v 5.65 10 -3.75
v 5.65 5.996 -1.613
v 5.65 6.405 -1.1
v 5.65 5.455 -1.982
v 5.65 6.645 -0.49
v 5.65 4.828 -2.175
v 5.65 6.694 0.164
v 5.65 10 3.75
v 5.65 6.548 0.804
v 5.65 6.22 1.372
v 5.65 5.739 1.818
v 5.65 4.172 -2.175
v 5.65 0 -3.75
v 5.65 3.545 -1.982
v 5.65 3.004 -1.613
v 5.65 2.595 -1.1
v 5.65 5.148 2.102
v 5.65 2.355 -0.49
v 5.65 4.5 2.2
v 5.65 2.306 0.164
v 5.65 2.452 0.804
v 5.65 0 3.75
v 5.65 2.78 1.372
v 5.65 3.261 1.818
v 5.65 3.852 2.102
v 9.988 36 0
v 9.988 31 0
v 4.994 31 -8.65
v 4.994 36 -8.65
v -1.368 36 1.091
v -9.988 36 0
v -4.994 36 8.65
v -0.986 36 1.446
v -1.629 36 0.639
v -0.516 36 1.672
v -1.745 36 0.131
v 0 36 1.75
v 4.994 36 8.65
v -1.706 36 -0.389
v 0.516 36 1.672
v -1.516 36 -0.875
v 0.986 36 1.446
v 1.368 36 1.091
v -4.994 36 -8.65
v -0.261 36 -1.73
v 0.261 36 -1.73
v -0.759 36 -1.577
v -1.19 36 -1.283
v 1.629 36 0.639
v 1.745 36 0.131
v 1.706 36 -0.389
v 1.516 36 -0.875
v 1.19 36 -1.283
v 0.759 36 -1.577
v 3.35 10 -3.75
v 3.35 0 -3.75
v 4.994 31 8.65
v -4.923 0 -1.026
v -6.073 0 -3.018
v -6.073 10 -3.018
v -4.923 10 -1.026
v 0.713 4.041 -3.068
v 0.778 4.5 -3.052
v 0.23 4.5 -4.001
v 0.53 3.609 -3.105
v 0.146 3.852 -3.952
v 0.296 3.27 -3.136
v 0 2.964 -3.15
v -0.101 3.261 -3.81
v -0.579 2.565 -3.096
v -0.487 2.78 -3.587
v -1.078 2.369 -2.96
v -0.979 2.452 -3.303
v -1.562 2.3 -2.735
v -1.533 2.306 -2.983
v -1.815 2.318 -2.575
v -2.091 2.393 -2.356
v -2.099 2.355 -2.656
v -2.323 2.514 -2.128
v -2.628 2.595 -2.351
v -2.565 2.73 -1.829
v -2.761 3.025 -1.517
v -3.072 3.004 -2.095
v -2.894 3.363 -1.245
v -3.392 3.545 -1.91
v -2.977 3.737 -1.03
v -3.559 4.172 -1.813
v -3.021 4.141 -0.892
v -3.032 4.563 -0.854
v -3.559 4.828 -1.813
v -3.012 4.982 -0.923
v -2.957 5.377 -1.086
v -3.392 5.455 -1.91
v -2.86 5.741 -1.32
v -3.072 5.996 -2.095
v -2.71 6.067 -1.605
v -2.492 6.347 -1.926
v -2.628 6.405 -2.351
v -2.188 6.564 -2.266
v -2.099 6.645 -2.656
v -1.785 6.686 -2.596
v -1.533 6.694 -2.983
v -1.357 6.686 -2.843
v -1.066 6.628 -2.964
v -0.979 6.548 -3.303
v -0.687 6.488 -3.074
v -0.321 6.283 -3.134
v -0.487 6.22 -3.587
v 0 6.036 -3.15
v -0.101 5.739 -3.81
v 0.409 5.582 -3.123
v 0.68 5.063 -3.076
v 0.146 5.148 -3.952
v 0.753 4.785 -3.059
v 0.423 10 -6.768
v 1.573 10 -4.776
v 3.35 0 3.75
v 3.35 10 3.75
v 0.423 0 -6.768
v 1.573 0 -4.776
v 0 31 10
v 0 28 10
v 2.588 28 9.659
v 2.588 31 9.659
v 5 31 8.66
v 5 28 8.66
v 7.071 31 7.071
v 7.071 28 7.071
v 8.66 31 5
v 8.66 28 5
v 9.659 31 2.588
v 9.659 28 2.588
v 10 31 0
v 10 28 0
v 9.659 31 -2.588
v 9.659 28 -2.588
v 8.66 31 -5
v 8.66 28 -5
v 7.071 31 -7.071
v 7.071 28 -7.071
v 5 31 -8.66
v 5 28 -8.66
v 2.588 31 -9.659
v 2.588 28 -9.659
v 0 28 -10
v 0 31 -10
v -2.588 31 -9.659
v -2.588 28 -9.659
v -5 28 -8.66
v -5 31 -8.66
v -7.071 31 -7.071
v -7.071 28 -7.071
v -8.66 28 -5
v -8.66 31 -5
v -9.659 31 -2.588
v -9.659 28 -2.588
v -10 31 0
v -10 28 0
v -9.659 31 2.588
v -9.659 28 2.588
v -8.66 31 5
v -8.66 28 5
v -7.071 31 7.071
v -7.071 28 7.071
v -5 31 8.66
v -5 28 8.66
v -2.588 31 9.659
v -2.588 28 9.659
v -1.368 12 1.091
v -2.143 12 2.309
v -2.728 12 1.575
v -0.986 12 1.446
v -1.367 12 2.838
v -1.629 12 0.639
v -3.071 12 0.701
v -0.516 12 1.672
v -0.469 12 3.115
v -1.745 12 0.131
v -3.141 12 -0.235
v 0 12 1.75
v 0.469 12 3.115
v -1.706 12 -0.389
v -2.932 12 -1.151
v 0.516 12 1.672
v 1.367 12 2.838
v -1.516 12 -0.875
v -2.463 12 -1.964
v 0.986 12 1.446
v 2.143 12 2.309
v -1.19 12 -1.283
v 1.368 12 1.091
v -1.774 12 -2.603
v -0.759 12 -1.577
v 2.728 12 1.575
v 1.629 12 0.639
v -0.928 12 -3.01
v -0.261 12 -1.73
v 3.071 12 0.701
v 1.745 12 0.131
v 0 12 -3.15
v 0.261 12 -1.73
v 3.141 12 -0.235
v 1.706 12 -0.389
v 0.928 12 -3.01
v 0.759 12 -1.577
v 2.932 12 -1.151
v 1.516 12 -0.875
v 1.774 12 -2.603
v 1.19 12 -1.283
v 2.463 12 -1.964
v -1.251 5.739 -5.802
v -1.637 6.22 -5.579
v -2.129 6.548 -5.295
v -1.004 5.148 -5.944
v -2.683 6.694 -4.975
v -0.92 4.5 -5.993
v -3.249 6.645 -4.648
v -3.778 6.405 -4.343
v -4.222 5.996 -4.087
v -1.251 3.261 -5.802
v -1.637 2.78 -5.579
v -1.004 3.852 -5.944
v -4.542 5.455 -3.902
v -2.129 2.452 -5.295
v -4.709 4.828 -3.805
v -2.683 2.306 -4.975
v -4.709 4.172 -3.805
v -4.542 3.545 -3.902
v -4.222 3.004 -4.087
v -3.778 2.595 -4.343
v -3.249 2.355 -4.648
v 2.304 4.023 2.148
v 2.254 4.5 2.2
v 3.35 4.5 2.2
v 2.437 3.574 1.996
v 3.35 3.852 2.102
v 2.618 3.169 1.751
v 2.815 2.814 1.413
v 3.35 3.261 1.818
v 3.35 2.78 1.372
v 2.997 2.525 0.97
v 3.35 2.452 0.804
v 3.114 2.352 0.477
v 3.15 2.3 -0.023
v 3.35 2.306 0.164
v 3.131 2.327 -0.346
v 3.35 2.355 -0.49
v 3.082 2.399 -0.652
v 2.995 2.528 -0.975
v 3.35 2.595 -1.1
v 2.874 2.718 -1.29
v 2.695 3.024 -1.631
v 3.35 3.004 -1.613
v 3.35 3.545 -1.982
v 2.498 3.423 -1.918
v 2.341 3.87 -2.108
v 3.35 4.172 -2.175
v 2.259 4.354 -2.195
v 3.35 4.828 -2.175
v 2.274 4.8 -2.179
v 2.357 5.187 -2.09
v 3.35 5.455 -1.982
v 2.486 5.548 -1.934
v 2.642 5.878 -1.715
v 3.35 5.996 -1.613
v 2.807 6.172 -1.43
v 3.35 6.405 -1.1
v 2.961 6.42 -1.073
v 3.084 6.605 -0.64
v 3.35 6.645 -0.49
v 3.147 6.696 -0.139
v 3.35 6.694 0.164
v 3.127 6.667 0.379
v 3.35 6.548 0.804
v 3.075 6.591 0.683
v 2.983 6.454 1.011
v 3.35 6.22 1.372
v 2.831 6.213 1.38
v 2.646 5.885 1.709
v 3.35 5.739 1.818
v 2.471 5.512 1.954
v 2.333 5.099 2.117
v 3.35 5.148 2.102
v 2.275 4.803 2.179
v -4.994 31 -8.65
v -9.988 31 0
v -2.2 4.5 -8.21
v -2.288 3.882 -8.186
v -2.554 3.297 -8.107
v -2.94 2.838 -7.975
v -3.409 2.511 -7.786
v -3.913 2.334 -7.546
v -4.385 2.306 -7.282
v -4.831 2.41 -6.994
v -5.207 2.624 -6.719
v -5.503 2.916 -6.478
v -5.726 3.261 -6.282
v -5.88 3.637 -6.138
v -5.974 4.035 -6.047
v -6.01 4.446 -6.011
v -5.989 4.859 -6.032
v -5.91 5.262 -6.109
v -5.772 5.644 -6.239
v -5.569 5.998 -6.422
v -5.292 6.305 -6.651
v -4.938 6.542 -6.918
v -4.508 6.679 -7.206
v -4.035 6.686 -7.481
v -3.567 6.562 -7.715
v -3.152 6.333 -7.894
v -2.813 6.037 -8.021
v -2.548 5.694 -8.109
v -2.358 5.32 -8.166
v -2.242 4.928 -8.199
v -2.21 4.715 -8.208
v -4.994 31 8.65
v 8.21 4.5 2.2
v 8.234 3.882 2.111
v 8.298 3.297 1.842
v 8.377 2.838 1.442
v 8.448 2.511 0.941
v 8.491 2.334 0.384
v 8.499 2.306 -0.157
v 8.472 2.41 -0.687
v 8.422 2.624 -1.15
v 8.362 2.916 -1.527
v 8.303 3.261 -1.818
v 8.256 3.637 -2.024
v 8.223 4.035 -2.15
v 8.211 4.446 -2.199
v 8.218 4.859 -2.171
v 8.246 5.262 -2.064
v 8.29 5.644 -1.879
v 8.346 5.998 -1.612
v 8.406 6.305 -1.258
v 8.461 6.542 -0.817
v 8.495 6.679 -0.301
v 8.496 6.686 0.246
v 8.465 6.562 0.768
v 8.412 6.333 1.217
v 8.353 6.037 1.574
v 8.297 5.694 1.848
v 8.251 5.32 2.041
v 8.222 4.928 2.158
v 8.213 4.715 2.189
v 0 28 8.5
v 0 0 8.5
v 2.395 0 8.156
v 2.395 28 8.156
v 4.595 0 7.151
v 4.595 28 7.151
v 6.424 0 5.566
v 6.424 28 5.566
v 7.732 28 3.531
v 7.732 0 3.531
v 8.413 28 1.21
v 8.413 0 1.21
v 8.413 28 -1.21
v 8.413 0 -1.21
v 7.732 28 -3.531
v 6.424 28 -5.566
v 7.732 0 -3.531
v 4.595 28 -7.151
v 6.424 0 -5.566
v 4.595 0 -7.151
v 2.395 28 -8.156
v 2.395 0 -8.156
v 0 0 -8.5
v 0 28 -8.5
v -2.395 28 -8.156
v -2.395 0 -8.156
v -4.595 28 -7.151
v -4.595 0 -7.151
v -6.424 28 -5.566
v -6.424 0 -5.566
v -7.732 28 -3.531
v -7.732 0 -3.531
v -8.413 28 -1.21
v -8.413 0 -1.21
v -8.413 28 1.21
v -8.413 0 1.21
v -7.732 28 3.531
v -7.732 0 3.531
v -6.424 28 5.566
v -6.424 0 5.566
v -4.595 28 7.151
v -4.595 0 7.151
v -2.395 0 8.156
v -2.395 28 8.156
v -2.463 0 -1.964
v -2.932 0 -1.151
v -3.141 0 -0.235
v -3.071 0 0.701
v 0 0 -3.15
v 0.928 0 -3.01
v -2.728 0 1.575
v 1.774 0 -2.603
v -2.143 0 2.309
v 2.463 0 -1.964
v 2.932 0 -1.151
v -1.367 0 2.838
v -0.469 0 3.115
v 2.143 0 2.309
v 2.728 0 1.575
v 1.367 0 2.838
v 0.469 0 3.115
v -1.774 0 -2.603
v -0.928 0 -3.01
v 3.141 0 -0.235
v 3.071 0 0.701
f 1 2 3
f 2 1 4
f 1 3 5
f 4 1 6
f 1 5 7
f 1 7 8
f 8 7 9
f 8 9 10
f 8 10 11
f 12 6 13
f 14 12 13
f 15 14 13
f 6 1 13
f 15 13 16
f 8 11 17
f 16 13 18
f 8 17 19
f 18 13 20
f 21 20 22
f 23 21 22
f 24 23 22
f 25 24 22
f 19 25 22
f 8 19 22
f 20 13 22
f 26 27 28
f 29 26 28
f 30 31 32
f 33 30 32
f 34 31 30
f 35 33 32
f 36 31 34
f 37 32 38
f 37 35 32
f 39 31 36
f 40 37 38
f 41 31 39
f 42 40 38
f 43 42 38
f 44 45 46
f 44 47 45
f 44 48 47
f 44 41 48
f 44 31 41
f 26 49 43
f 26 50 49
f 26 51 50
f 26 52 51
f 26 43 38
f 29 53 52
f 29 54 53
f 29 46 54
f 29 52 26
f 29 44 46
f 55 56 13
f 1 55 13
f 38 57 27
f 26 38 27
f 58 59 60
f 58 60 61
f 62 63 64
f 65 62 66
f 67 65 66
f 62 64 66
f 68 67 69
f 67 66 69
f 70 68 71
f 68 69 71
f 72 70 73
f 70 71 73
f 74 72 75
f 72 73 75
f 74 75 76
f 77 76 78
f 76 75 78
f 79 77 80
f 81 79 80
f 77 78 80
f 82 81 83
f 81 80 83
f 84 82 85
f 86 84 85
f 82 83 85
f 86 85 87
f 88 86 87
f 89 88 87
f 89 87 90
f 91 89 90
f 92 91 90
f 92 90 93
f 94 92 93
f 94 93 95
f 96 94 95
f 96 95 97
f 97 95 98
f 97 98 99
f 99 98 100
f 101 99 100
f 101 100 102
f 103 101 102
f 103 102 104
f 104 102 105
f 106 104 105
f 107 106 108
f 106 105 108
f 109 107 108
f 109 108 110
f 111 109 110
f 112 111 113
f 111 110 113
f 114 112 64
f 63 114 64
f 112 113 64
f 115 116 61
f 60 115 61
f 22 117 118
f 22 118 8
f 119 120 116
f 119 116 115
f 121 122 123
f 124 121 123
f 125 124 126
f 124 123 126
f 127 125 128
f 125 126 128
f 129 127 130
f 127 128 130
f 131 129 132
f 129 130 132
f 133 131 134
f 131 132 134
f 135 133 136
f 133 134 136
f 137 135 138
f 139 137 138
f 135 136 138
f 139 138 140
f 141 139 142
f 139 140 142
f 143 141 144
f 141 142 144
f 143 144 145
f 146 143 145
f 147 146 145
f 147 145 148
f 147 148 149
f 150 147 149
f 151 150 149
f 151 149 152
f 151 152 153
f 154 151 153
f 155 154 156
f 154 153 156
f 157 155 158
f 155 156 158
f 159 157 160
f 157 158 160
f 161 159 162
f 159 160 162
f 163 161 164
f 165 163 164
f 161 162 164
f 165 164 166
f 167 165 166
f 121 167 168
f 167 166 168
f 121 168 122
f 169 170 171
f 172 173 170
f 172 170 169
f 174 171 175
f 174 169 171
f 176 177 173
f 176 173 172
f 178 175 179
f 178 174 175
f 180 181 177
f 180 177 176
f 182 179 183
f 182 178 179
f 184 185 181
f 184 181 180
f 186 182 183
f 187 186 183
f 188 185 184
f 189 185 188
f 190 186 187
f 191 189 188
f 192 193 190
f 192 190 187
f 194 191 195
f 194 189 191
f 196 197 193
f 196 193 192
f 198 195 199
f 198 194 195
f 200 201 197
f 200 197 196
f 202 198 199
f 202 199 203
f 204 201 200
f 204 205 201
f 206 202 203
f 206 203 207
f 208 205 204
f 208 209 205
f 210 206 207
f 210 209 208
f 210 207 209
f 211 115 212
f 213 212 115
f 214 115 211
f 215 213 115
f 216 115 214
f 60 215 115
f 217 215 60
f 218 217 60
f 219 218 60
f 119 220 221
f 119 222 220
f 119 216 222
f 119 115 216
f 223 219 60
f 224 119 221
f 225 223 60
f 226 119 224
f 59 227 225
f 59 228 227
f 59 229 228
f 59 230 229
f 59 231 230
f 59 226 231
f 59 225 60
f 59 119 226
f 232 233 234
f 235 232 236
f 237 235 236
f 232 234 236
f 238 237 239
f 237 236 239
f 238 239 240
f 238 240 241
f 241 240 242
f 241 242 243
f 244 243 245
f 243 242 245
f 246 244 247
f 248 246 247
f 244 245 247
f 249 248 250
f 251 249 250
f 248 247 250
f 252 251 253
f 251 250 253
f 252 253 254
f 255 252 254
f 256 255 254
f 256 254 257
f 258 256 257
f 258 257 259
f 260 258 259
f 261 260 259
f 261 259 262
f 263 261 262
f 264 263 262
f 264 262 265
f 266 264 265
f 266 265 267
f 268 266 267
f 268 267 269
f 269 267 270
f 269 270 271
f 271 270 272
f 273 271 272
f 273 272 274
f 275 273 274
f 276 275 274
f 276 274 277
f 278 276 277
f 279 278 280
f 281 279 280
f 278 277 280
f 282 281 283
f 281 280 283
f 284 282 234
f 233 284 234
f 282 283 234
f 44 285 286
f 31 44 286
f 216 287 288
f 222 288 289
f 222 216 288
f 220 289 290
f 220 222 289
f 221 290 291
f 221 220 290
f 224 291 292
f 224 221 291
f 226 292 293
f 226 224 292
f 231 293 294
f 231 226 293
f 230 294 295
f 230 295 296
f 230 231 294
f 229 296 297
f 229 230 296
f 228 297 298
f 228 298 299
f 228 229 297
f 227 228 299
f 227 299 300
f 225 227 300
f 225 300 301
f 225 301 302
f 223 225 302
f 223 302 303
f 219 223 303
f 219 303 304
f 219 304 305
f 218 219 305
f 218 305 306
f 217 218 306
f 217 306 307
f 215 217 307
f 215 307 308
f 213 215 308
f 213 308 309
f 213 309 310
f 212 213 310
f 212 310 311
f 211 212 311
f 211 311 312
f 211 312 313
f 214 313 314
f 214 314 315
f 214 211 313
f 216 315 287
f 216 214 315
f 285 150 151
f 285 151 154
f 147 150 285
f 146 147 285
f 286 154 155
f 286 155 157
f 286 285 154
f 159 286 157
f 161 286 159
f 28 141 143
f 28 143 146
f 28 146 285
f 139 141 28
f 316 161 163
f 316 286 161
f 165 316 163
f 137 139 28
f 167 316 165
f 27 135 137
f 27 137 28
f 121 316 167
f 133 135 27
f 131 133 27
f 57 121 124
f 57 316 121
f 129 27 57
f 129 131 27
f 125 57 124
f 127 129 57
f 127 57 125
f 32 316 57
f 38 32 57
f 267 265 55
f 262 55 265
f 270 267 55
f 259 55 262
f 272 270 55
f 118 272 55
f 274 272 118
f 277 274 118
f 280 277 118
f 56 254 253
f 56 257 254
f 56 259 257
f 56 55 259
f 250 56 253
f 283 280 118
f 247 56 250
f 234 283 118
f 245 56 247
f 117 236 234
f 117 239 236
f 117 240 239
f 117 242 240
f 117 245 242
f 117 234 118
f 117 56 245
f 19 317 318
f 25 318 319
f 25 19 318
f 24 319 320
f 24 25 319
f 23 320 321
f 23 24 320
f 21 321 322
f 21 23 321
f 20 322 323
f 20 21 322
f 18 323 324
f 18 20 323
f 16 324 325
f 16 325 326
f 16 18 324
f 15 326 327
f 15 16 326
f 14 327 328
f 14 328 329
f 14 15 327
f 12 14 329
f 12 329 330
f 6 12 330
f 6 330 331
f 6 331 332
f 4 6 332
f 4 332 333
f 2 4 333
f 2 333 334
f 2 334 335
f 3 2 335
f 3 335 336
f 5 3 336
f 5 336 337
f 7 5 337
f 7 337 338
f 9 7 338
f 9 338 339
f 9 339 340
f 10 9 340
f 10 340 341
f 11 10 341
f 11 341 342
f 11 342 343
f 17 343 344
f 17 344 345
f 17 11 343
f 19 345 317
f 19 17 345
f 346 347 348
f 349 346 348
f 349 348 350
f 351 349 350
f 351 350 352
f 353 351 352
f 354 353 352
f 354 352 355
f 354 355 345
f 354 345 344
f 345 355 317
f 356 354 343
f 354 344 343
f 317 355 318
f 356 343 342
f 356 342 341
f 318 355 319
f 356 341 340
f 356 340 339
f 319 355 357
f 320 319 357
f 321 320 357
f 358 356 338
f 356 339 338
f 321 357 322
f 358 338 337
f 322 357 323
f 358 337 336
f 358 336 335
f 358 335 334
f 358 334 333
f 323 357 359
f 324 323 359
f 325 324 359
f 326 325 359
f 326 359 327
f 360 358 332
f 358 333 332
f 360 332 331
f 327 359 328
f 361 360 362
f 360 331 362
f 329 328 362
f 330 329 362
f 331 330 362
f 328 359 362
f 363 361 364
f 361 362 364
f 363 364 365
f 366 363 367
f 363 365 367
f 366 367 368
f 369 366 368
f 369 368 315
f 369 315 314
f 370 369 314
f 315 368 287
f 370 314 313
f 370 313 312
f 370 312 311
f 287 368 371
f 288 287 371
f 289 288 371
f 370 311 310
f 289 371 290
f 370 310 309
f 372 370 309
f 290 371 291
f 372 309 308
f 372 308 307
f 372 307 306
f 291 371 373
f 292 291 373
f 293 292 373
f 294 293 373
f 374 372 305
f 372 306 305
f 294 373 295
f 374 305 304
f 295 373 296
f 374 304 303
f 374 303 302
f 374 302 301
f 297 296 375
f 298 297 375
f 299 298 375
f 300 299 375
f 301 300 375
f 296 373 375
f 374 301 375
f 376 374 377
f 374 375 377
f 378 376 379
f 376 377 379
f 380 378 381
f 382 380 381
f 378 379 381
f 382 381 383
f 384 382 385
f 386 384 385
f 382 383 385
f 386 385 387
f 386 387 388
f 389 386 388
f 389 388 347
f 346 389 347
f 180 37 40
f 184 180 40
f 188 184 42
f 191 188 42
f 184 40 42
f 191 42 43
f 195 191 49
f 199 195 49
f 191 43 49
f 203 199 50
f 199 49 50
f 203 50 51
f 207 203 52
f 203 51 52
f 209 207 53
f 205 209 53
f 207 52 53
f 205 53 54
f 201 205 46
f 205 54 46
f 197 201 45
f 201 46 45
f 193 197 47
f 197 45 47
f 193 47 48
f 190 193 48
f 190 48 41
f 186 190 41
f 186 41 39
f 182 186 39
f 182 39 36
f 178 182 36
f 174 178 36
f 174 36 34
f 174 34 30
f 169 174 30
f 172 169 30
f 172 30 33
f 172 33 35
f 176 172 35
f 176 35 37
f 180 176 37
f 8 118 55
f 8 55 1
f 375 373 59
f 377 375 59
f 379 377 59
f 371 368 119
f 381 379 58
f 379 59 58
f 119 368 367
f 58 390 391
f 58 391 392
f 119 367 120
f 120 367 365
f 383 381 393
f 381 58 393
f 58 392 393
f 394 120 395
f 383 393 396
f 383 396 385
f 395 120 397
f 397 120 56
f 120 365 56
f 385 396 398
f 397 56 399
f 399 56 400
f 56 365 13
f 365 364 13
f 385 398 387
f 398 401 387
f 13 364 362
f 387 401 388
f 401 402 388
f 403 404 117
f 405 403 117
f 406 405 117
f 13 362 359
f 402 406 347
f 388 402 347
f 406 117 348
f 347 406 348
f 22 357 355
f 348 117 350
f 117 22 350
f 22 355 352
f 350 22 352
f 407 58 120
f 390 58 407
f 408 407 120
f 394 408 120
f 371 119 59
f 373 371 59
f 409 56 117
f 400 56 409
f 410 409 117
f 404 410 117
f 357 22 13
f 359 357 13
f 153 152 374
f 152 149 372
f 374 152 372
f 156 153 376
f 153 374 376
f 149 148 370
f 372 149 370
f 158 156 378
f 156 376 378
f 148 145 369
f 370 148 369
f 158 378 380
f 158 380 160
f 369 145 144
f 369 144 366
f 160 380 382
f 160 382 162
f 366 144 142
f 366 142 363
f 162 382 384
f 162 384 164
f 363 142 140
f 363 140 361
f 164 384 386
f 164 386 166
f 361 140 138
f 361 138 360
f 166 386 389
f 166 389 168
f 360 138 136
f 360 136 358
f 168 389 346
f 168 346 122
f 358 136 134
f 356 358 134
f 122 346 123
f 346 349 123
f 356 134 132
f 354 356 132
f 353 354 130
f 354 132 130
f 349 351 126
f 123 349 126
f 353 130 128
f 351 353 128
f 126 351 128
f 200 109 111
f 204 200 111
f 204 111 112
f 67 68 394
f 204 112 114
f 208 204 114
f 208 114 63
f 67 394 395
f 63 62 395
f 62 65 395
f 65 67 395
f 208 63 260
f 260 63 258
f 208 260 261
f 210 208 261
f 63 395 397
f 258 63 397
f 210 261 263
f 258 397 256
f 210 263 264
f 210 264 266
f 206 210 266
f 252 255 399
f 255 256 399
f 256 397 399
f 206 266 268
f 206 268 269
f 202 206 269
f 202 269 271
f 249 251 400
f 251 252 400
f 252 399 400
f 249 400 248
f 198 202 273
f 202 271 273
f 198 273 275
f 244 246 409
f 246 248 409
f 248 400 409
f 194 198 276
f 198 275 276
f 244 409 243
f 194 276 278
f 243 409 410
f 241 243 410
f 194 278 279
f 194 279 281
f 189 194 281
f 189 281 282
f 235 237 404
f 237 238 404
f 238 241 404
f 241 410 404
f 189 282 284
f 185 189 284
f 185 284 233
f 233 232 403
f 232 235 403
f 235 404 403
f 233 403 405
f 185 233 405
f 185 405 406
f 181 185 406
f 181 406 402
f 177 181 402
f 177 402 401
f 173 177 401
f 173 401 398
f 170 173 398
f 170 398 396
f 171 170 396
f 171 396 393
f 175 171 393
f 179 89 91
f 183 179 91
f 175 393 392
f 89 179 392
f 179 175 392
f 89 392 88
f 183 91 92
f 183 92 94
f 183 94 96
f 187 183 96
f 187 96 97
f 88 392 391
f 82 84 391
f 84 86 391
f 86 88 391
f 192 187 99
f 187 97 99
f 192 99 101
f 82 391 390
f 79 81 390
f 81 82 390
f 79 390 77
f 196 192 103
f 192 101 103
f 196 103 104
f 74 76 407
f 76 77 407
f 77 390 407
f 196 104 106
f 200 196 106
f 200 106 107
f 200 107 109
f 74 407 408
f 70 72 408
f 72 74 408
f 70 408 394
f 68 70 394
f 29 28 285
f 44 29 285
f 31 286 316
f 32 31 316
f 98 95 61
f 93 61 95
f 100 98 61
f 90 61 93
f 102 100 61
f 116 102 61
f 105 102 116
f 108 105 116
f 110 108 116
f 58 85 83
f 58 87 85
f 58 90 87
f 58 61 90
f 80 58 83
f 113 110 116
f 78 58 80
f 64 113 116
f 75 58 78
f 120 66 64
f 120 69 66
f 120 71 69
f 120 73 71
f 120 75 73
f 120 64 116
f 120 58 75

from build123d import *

# Parameters (mm, degrees)
SKETCH_1_R                           = 8.5
EXTRUDE_537_DEPTH                    = 28
SKETCH_2_R                           = 10
EXTRUDE_624_DEPTH                    = 3
EXTRUDE_747_DEPTH                    = 5
SKETCH_4_R                           = 3.15
CUT_EXTRUDE_845_DEPTH                = 12
SKETCH_5_W                           = 2.3
SKETCH_5_H                           = 7.5
CUT_EXTRUDE_1044_DEPTH               = 10
SKETCH_6_R                           = 2.2
CUT_EXTRUDE_1_DEPTH                  = 40.676472878
CUT_EXTRUDE_1_DIRECTION_2_REACH      = 41.676
CUT_EXTRUDE_1_DIRECTION_2_END_RADIUS = 3.15
SKETCH_7_R                           = 2.2
CUT_EXTRUDE_2_DEPTH                  = 40.984324454
CUT_EXTRUDE_2_DIRECTION_2_REACH      = 41.984
CUT_EXTRUDE_2_DIRECTION_2_END_RADIUS = 3.15
SKETCH_10_R                          = 1.75
CUT_EXTRUDE_1470_DEPTH               = 39.678159305


with BuildPart() as part:
    # Эскиз1 → Extrude 537 (new body)
    with BuildSketch(Plane(origin=(0, 0, 0), x_dir=(1, 0, 0), z_dir=(0, 1, 0))):
        with Locations(Location((0, 0, 0), (0, 0, 270))):
            Circle(SKETCH_1_R)
    extrude(amount=EXTRUDE_537_DEPTH)

    # Эскиз2 → Extrude 624 (add)
    with BuildSketch(Plane(origin=(0, 28, 0), x_dir=(1, 0, 0), z_dir=(0, 1, 0))):
        with Locations(Location((0, 0, 0), (0, 0, 270))):
            Circle(SKETCH_2_R)
    extrude(amount=EXTRUDE_624_DEPTH)

    # Эскиз3 → Extrude 747 (add)
    with BuildSketch(Plane(origin=(0, 31, 0), x_dir=(1, 0, 0), z_dir=(0, 1, 0))):
        Polygon((9.988159657, 0), (4.994079828, 8.65), (-4.994079828, 8.65), (-9.988159657, 0), (-4.994079828, -8.65), (4.994079828, -8.65), align=None)
    extrude(amount=EXTRUDE_747_DEPTH)

    # Эскиз4 → Cut-Extrude 845 (cut)
    with BuildSketch(Plane.XZ):
        with Locations(Location((0, 0, 0), (0, 0, 270))):
            Circle(SKETCH_4_R)
    extrude(amount=-CUT_EXTRUDE_845_DEPTH, mode=Mode.SUBTRACT)

    # Эскиз5 → Cut-Extrude 1044 (cut)
    with BuildSketch(Plane.XZ):
        with Locations((4.5, 0)):
            Rectangle(SKETCH_5_W, SKETCH_5_H)
        Polygon((-4.922595264, -1.026185103), (1.572595264, -4.776185103), (0.422595264, -6.768043531), (-6.072595264, -3.018043531), align=None)
    extrude(amount=-CUT_EXTRUDE_1044_DEPTH, mode=Mode.SUBTRACT)

    # Эскиз6 → отверстие чтоб прикрутить 1 (cut)
    with BuildSketch(Plane(origin=(3.35, 0, 0), x_dir=(0, 0, -1), z_dir=(1, 0, 0))):
        with Locations(Location((0, 4.5, 0), (0, 0, 180))):
            Circle(SKETCH_6_R)
    extrude(amount=CUT_EXTRUDE_1_DEPTH, mode=Mode.SUBTRACT)

    # отверстие чтоб прикрутить 1 direction 2: up to this cylinder (the profile starts outside it)
    cut_extrude_1_direction_2_end = Plane(origin=(0, 4.5, 0), z_dir=(0, -1, 0)) * Cylinder(CUT_EXTRUDE_1_DIRECTION_2_END_RADIUS, 90.652, mode=Mode.PRIVATE)
    # Эскиз6 → отверстие чтоб прикрутить 1 direction 2 (cut, up to the surface)
    with BuildSketch(Plane(origin=(3.35, 0, 0), x_dir=(0, 0, -1), z_dir=(1, 0, 0)), mode=Mode.PRIVATE) as cut_extrude_1_direction_2_sk1:
        with Locations(Location((0, 4.5, 0), (0, 0, 180))):
            Circle(SKETCH_6_R)
    cut_extrude_1_direction_2_tool1 = extrude(cut_extrude_1_direction_2_sk1.sketch, amount=-CUT_EXTRUDE_1_DIRECTION_2_REACH, mode=Mode.PRIVATE) - cut_extrude_1_direction_2_end
    add(cut_extrude_1_direction_2_tool1.solids().sort_by_distance((3.35, 4.5, 0))[0], mode=Mode.SUBTRACT)

    # Эскиз7 → отверстие чтоб прикрутить 2 (cut)
    with BuildSketch(Plane(origin=(-1.675, 0, -2.901185103), x_dir=(-0.8660254037844362, 0, 0.5000000000000042), z_dir=(-0.5000000000000043, 0, -0.8660254037844363))):
        with Locations(Location((0, 4.5, 0), (0, 0, 180))):
            Circle(SKETCH_7_R)
    extrude(amount=CUT_EXTRUDE_2_DEPTH, mode=Mode.SUBTRACT)

    # отверстие чтоб прикрутить 2 direction 2: up to this cylinder (the profile starts outside it)
    cut_extrude_2_direction_2_end = Plane(origin=(0, 4.5, 0), z_dir=(0, -1, 0)) * Cylinder(CUT_EXTRUDE_2_DIRECTION_2_END_RADIUS, 91.268, mode=Mode.PRIVATE)
    # Эскиз7 → отверстие чтоб прикрутить 2 direction 2 (cut, up to the surface)
    with BuildSketch(Plane(origin=(-1.675, 0, -2.901185103), x_dir=(-0.8660254037844362, 0, 0.5000000000000042), z_dir=(-0.5000000000000043, 0, -0.8660254037844363)), mode=Mode.PRIVATE) as cut_extrude_2_direction_2_sk1:
        with Locations(Location((0, 4.5, 0), (0, 0, 180))):
            Circle(SKETCH_7_R)
    cut_extrude_2_direction_2_tool1 = extrude(cut_extrude_2_direction_2_sk1.sketch, amount=-CUT_EXTRUDE_2_DIRECTION_2_REACH, mode=Mode.PRIVATE) - cut_extrude_2_direction_2_end
    add(cut_extrude_2_direction_2_tool1.solids().sort_by_distance((-1.675, 4.5, -2.901185))[0], mode=Mode.SUBTRACT)

    # Эскиз10 → Cut-Extrude 1470 (cut, through all)
    with BuildSketch(Plane(origin=(0, 36, 0), x_dir=(1, 0, 0), z_dir=(0, 1, 0))):
        with Locations(Location((0, 0, 0), (0, 0, 270))):
            Circle(SKETCH_10_R)
    extrude(amount=-CUT_EXTRUDE_1470_DEPTH, mode=Mode.SUBTRACT)


solid = part.part
